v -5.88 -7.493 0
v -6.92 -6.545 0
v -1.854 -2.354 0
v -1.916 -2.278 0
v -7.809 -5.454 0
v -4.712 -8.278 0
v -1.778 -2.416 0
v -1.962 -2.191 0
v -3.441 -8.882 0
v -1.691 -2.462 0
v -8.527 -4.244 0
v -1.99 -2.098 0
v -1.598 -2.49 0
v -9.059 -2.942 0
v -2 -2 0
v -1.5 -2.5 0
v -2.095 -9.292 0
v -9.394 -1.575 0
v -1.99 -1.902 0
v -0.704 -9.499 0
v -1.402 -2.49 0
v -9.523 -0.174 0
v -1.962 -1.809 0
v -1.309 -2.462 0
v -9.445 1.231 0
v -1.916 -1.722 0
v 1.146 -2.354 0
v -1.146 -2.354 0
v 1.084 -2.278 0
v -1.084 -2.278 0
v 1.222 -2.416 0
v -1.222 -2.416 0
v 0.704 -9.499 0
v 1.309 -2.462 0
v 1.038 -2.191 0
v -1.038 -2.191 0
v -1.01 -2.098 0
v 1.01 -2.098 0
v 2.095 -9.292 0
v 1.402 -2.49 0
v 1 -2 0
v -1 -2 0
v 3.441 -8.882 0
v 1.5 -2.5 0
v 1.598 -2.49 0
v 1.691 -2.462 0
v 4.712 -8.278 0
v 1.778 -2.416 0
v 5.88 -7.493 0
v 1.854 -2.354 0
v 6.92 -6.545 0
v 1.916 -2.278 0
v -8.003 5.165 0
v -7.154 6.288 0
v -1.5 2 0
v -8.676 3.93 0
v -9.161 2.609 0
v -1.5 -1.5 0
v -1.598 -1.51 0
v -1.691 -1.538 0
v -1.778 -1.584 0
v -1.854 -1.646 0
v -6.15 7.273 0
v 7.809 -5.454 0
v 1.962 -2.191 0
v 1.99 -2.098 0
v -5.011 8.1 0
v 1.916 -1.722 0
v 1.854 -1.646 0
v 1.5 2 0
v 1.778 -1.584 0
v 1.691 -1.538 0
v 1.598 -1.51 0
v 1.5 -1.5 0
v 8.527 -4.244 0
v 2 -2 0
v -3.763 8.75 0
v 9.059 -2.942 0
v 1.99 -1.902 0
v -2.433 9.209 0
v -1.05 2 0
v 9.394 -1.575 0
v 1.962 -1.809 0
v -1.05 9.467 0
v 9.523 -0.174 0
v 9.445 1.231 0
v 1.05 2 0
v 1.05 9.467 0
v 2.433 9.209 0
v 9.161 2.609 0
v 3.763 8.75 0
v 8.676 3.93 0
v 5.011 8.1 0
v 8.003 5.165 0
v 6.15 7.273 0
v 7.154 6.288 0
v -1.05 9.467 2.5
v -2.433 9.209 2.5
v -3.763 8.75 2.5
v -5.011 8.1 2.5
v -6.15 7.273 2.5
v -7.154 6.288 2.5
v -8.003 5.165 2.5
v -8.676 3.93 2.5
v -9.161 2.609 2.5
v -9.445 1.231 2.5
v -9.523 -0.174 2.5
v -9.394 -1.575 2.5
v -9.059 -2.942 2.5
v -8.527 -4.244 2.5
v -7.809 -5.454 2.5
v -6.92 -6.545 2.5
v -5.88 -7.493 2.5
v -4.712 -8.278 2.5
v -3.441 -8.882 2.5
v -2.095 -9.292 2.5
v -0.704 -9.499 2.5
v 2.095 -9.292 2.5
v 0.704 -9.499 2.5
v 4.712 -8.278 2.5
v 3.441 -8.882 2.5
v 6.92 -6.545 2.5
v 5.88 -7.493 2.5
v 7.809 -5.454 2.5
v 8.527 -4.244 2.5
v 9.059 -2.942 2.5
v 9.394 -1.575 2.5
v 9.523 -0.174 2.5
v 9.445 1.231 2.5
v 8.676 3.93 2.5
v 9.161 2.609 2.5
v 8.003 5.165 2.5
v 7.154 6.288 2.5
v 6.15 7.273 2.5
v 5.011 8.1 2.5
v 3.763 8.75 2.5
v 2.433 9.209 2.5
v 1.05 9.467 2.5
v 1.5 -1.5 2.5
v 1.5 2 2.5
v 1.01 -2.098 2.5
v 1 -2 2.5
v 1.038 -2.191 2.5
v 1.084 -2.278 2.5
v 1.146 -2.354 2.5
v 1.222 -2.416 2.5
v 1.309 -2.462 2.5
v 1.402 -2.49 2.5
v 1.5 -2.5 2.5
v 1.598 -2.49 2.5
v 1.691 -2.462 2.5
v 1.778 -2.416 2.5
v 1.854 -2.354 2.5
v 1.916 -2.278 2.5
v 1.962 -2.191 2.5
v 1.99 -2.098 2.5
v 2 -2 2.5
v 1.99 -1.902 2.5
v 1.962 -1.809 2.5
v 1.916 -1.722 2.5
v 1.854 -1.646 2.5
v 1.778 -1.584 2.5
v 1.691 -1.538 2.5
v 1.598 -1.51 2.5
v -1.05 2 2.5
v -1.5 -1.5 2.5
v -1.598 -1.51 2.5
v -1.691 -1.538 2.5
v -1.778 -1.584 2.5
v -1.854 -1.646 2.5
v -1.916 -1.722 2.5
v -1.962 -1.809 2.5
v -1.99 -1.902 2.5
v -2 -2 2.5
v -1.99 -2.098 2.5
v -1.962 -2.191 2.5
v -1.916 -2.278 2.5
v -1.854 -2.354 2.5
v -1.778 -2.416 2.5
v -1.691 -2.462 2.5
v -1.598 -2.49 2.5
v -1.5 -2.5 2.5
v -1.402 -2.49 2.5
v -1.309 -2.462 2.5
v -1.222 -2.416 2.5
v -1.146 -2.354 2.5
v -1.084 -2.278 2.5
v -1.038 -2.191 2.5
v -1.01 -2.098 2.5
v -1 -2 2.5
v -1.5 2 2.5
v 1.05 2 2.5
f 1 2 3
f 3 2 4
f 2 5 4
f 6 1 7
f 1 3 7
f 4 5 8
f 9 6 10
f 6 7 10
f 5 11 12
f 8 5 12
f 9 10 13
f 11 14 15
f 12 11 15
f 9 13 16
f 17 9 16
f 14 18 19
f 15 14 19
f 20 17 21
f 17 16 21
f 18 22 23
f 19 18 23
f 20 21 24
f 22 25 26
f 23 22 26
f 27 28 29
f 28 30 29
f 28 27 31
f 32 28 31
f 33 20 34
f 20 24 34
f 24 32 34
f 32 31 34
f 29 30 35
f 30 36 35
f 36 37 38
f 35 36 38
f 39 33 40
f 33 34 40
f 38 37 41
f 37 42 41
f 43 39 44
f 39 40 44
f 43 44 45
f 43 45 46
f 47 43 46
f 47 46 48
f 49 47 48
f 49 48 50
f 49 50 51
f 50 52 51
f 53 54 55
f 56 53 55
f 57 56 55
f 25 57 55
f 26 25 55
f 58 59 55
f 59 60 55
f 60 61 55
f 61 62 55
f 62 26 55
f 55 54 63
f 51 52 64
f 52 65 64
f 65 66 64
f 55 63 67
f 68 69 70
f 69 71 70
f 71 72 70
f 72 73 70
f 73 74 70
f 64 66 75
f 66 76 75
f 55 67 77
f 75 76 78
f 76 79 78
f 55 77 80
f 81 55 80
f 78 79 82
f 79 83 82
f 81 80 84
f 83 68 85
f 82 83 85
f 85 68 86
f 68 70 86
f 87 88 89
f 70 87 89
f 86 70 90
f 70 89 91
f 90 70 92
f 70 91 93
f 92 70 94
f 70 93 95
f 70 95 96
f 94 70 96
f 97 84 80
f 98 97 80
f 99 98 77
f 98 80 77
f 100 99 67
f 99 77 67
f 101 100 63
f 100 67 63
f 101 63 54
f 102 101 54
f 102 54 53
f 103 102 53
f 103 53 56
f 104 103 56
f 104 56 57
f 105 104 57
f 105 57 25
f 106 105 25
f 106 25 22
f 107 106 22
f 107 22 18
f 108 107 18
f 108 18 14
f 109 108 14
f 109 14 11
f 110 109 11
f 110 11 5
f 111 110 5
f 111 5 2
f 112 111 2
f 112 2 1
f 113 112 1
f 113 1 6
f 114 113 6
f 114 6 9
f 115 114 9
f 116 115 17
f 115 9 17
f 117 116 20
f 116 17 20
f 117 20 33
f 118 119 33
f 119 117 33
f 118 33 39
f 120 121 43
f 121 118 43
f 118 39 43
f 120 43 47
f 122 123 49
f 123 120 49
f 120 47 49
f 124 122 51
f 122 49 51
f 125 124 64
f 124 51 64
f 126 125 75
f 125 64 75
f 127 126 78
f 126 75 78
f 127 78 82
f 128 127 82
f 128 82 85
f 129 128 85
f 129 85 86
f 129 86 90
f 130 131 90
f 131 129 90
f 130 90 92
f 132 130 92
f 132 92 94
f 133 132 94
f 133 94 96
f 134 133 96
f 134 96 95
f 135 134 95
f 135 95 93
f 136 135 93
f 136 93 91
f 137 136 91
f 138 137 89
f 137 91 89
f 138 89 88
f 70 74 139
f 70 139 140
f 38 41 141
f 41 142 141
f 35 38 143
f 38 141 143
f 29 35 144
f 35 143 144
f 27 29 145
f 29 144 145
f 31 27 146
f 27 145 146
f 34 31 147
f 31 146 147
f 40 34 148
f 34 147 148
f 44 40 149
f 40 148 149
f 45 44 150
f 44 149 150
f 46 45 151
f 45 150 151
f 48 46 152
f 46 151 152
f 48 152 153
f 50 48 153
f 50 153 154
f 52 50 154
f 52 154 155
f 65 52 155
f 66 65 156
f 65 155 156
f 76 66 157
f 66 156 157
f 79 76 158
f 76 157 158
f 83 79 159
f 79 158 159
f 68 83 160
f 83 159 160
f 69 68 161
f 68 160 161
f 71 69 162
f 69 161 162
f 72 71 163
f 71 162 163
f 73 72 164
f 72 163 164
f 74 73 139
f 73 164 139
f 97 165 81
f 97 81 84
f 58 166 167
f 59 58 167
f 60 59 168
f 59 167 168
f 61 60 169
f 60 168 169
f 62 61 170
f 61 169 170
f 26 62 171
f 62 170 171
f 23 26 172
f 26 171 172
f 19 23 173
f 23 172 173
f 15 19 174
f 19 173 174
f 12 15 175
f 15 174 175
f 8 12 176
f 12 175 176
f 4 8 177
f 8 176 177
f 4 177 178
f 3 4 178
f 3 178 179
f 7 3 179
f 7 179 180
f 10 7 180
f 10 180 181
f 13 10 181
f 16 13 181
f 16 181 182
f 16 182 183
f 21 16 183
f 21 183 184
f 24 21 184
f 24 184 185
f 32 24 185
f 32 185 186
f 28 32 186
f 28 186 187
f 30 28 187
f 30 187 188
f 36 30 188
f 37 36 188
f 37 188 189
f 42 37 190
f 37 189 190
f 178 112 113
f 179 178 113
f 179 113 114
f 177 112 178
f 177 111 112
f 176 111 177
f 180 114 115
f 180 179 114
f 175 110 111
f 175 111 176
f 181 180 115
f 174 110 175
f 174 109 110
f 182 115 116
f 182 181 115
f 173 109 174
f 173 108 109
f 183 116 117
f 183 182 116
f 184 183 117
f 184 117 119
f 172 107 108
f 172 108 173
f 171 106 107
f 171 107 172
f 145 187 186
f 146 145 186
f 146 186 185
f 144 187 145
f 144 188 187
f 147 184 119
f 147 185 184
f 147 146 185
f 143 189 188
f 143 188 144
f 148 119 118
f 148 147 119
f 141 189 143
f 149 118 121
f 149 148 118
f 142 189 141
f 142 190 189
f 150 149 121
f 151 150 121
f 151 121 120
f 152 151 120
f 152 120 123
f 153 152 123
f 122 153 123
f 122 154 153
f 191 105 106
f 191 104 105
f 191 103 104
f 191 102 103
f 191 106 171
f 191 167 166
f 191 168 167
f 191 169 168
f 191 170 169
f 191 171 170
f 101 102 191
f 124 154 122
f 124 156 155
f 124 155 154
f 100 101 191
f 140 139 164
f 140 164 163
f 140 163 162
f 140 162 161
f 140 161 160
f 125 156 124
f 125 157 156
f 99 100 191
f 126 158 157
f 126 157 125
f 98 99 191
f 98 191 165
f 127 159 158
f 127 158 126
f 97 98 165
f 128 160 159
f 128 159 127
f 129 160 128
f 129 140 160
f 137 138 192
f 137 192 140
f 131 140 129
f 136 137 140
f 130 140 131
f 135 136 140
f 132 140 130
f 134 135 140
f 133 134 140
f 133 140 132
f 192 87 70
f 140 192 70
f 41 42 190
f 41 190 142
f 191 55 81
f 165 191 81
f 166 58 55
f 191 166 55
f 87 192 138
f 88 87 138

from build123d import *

# Parameters (mm, degrees)
SKETCH1_R           = 9.525
SKETCH1_W           = 3
SKETCH1_H           = 4
BOSS_EXTRUDE1_DEPTH = 2.5
SKETCH2_R           = 0.5
SKETCH2_W           = 2.1
SKETCH2_H           = 7.525
CUT_EXTRUDE1_DEPTH  = 14.700410578


with BuildPart() as part:
    # Sketch1 → Boss-Extrude1 (new body)
    with BuildSketch(Plane.XY):
        Circle(SKETCH1_R)
        Rectangle(SKETCH1_W, SKETCH1_H, mode=Mode.SUBTRACT)
    extrude(amount=BOSS_EXTRUDE1_DEPTH)

    # Sketch2 → Cut-Extrude1 (cut, through all)
    with BuildSketch(Plane.XY.offset(2.5)):
        with Locations((-1.5, -2)):
            Circle(SKETCH2_R)
        with Locations((1.5, -2)):
            Circle(SKETCH2_R)
        with Locations((0, 5.7625)):
            Rectangle(SKETCH2_W, SKETCH2_H)
    extrude(amount=-CUT_EXTRUDE1_DEPTH, mode=Mode.SUBTRACT)


solid = part.part
